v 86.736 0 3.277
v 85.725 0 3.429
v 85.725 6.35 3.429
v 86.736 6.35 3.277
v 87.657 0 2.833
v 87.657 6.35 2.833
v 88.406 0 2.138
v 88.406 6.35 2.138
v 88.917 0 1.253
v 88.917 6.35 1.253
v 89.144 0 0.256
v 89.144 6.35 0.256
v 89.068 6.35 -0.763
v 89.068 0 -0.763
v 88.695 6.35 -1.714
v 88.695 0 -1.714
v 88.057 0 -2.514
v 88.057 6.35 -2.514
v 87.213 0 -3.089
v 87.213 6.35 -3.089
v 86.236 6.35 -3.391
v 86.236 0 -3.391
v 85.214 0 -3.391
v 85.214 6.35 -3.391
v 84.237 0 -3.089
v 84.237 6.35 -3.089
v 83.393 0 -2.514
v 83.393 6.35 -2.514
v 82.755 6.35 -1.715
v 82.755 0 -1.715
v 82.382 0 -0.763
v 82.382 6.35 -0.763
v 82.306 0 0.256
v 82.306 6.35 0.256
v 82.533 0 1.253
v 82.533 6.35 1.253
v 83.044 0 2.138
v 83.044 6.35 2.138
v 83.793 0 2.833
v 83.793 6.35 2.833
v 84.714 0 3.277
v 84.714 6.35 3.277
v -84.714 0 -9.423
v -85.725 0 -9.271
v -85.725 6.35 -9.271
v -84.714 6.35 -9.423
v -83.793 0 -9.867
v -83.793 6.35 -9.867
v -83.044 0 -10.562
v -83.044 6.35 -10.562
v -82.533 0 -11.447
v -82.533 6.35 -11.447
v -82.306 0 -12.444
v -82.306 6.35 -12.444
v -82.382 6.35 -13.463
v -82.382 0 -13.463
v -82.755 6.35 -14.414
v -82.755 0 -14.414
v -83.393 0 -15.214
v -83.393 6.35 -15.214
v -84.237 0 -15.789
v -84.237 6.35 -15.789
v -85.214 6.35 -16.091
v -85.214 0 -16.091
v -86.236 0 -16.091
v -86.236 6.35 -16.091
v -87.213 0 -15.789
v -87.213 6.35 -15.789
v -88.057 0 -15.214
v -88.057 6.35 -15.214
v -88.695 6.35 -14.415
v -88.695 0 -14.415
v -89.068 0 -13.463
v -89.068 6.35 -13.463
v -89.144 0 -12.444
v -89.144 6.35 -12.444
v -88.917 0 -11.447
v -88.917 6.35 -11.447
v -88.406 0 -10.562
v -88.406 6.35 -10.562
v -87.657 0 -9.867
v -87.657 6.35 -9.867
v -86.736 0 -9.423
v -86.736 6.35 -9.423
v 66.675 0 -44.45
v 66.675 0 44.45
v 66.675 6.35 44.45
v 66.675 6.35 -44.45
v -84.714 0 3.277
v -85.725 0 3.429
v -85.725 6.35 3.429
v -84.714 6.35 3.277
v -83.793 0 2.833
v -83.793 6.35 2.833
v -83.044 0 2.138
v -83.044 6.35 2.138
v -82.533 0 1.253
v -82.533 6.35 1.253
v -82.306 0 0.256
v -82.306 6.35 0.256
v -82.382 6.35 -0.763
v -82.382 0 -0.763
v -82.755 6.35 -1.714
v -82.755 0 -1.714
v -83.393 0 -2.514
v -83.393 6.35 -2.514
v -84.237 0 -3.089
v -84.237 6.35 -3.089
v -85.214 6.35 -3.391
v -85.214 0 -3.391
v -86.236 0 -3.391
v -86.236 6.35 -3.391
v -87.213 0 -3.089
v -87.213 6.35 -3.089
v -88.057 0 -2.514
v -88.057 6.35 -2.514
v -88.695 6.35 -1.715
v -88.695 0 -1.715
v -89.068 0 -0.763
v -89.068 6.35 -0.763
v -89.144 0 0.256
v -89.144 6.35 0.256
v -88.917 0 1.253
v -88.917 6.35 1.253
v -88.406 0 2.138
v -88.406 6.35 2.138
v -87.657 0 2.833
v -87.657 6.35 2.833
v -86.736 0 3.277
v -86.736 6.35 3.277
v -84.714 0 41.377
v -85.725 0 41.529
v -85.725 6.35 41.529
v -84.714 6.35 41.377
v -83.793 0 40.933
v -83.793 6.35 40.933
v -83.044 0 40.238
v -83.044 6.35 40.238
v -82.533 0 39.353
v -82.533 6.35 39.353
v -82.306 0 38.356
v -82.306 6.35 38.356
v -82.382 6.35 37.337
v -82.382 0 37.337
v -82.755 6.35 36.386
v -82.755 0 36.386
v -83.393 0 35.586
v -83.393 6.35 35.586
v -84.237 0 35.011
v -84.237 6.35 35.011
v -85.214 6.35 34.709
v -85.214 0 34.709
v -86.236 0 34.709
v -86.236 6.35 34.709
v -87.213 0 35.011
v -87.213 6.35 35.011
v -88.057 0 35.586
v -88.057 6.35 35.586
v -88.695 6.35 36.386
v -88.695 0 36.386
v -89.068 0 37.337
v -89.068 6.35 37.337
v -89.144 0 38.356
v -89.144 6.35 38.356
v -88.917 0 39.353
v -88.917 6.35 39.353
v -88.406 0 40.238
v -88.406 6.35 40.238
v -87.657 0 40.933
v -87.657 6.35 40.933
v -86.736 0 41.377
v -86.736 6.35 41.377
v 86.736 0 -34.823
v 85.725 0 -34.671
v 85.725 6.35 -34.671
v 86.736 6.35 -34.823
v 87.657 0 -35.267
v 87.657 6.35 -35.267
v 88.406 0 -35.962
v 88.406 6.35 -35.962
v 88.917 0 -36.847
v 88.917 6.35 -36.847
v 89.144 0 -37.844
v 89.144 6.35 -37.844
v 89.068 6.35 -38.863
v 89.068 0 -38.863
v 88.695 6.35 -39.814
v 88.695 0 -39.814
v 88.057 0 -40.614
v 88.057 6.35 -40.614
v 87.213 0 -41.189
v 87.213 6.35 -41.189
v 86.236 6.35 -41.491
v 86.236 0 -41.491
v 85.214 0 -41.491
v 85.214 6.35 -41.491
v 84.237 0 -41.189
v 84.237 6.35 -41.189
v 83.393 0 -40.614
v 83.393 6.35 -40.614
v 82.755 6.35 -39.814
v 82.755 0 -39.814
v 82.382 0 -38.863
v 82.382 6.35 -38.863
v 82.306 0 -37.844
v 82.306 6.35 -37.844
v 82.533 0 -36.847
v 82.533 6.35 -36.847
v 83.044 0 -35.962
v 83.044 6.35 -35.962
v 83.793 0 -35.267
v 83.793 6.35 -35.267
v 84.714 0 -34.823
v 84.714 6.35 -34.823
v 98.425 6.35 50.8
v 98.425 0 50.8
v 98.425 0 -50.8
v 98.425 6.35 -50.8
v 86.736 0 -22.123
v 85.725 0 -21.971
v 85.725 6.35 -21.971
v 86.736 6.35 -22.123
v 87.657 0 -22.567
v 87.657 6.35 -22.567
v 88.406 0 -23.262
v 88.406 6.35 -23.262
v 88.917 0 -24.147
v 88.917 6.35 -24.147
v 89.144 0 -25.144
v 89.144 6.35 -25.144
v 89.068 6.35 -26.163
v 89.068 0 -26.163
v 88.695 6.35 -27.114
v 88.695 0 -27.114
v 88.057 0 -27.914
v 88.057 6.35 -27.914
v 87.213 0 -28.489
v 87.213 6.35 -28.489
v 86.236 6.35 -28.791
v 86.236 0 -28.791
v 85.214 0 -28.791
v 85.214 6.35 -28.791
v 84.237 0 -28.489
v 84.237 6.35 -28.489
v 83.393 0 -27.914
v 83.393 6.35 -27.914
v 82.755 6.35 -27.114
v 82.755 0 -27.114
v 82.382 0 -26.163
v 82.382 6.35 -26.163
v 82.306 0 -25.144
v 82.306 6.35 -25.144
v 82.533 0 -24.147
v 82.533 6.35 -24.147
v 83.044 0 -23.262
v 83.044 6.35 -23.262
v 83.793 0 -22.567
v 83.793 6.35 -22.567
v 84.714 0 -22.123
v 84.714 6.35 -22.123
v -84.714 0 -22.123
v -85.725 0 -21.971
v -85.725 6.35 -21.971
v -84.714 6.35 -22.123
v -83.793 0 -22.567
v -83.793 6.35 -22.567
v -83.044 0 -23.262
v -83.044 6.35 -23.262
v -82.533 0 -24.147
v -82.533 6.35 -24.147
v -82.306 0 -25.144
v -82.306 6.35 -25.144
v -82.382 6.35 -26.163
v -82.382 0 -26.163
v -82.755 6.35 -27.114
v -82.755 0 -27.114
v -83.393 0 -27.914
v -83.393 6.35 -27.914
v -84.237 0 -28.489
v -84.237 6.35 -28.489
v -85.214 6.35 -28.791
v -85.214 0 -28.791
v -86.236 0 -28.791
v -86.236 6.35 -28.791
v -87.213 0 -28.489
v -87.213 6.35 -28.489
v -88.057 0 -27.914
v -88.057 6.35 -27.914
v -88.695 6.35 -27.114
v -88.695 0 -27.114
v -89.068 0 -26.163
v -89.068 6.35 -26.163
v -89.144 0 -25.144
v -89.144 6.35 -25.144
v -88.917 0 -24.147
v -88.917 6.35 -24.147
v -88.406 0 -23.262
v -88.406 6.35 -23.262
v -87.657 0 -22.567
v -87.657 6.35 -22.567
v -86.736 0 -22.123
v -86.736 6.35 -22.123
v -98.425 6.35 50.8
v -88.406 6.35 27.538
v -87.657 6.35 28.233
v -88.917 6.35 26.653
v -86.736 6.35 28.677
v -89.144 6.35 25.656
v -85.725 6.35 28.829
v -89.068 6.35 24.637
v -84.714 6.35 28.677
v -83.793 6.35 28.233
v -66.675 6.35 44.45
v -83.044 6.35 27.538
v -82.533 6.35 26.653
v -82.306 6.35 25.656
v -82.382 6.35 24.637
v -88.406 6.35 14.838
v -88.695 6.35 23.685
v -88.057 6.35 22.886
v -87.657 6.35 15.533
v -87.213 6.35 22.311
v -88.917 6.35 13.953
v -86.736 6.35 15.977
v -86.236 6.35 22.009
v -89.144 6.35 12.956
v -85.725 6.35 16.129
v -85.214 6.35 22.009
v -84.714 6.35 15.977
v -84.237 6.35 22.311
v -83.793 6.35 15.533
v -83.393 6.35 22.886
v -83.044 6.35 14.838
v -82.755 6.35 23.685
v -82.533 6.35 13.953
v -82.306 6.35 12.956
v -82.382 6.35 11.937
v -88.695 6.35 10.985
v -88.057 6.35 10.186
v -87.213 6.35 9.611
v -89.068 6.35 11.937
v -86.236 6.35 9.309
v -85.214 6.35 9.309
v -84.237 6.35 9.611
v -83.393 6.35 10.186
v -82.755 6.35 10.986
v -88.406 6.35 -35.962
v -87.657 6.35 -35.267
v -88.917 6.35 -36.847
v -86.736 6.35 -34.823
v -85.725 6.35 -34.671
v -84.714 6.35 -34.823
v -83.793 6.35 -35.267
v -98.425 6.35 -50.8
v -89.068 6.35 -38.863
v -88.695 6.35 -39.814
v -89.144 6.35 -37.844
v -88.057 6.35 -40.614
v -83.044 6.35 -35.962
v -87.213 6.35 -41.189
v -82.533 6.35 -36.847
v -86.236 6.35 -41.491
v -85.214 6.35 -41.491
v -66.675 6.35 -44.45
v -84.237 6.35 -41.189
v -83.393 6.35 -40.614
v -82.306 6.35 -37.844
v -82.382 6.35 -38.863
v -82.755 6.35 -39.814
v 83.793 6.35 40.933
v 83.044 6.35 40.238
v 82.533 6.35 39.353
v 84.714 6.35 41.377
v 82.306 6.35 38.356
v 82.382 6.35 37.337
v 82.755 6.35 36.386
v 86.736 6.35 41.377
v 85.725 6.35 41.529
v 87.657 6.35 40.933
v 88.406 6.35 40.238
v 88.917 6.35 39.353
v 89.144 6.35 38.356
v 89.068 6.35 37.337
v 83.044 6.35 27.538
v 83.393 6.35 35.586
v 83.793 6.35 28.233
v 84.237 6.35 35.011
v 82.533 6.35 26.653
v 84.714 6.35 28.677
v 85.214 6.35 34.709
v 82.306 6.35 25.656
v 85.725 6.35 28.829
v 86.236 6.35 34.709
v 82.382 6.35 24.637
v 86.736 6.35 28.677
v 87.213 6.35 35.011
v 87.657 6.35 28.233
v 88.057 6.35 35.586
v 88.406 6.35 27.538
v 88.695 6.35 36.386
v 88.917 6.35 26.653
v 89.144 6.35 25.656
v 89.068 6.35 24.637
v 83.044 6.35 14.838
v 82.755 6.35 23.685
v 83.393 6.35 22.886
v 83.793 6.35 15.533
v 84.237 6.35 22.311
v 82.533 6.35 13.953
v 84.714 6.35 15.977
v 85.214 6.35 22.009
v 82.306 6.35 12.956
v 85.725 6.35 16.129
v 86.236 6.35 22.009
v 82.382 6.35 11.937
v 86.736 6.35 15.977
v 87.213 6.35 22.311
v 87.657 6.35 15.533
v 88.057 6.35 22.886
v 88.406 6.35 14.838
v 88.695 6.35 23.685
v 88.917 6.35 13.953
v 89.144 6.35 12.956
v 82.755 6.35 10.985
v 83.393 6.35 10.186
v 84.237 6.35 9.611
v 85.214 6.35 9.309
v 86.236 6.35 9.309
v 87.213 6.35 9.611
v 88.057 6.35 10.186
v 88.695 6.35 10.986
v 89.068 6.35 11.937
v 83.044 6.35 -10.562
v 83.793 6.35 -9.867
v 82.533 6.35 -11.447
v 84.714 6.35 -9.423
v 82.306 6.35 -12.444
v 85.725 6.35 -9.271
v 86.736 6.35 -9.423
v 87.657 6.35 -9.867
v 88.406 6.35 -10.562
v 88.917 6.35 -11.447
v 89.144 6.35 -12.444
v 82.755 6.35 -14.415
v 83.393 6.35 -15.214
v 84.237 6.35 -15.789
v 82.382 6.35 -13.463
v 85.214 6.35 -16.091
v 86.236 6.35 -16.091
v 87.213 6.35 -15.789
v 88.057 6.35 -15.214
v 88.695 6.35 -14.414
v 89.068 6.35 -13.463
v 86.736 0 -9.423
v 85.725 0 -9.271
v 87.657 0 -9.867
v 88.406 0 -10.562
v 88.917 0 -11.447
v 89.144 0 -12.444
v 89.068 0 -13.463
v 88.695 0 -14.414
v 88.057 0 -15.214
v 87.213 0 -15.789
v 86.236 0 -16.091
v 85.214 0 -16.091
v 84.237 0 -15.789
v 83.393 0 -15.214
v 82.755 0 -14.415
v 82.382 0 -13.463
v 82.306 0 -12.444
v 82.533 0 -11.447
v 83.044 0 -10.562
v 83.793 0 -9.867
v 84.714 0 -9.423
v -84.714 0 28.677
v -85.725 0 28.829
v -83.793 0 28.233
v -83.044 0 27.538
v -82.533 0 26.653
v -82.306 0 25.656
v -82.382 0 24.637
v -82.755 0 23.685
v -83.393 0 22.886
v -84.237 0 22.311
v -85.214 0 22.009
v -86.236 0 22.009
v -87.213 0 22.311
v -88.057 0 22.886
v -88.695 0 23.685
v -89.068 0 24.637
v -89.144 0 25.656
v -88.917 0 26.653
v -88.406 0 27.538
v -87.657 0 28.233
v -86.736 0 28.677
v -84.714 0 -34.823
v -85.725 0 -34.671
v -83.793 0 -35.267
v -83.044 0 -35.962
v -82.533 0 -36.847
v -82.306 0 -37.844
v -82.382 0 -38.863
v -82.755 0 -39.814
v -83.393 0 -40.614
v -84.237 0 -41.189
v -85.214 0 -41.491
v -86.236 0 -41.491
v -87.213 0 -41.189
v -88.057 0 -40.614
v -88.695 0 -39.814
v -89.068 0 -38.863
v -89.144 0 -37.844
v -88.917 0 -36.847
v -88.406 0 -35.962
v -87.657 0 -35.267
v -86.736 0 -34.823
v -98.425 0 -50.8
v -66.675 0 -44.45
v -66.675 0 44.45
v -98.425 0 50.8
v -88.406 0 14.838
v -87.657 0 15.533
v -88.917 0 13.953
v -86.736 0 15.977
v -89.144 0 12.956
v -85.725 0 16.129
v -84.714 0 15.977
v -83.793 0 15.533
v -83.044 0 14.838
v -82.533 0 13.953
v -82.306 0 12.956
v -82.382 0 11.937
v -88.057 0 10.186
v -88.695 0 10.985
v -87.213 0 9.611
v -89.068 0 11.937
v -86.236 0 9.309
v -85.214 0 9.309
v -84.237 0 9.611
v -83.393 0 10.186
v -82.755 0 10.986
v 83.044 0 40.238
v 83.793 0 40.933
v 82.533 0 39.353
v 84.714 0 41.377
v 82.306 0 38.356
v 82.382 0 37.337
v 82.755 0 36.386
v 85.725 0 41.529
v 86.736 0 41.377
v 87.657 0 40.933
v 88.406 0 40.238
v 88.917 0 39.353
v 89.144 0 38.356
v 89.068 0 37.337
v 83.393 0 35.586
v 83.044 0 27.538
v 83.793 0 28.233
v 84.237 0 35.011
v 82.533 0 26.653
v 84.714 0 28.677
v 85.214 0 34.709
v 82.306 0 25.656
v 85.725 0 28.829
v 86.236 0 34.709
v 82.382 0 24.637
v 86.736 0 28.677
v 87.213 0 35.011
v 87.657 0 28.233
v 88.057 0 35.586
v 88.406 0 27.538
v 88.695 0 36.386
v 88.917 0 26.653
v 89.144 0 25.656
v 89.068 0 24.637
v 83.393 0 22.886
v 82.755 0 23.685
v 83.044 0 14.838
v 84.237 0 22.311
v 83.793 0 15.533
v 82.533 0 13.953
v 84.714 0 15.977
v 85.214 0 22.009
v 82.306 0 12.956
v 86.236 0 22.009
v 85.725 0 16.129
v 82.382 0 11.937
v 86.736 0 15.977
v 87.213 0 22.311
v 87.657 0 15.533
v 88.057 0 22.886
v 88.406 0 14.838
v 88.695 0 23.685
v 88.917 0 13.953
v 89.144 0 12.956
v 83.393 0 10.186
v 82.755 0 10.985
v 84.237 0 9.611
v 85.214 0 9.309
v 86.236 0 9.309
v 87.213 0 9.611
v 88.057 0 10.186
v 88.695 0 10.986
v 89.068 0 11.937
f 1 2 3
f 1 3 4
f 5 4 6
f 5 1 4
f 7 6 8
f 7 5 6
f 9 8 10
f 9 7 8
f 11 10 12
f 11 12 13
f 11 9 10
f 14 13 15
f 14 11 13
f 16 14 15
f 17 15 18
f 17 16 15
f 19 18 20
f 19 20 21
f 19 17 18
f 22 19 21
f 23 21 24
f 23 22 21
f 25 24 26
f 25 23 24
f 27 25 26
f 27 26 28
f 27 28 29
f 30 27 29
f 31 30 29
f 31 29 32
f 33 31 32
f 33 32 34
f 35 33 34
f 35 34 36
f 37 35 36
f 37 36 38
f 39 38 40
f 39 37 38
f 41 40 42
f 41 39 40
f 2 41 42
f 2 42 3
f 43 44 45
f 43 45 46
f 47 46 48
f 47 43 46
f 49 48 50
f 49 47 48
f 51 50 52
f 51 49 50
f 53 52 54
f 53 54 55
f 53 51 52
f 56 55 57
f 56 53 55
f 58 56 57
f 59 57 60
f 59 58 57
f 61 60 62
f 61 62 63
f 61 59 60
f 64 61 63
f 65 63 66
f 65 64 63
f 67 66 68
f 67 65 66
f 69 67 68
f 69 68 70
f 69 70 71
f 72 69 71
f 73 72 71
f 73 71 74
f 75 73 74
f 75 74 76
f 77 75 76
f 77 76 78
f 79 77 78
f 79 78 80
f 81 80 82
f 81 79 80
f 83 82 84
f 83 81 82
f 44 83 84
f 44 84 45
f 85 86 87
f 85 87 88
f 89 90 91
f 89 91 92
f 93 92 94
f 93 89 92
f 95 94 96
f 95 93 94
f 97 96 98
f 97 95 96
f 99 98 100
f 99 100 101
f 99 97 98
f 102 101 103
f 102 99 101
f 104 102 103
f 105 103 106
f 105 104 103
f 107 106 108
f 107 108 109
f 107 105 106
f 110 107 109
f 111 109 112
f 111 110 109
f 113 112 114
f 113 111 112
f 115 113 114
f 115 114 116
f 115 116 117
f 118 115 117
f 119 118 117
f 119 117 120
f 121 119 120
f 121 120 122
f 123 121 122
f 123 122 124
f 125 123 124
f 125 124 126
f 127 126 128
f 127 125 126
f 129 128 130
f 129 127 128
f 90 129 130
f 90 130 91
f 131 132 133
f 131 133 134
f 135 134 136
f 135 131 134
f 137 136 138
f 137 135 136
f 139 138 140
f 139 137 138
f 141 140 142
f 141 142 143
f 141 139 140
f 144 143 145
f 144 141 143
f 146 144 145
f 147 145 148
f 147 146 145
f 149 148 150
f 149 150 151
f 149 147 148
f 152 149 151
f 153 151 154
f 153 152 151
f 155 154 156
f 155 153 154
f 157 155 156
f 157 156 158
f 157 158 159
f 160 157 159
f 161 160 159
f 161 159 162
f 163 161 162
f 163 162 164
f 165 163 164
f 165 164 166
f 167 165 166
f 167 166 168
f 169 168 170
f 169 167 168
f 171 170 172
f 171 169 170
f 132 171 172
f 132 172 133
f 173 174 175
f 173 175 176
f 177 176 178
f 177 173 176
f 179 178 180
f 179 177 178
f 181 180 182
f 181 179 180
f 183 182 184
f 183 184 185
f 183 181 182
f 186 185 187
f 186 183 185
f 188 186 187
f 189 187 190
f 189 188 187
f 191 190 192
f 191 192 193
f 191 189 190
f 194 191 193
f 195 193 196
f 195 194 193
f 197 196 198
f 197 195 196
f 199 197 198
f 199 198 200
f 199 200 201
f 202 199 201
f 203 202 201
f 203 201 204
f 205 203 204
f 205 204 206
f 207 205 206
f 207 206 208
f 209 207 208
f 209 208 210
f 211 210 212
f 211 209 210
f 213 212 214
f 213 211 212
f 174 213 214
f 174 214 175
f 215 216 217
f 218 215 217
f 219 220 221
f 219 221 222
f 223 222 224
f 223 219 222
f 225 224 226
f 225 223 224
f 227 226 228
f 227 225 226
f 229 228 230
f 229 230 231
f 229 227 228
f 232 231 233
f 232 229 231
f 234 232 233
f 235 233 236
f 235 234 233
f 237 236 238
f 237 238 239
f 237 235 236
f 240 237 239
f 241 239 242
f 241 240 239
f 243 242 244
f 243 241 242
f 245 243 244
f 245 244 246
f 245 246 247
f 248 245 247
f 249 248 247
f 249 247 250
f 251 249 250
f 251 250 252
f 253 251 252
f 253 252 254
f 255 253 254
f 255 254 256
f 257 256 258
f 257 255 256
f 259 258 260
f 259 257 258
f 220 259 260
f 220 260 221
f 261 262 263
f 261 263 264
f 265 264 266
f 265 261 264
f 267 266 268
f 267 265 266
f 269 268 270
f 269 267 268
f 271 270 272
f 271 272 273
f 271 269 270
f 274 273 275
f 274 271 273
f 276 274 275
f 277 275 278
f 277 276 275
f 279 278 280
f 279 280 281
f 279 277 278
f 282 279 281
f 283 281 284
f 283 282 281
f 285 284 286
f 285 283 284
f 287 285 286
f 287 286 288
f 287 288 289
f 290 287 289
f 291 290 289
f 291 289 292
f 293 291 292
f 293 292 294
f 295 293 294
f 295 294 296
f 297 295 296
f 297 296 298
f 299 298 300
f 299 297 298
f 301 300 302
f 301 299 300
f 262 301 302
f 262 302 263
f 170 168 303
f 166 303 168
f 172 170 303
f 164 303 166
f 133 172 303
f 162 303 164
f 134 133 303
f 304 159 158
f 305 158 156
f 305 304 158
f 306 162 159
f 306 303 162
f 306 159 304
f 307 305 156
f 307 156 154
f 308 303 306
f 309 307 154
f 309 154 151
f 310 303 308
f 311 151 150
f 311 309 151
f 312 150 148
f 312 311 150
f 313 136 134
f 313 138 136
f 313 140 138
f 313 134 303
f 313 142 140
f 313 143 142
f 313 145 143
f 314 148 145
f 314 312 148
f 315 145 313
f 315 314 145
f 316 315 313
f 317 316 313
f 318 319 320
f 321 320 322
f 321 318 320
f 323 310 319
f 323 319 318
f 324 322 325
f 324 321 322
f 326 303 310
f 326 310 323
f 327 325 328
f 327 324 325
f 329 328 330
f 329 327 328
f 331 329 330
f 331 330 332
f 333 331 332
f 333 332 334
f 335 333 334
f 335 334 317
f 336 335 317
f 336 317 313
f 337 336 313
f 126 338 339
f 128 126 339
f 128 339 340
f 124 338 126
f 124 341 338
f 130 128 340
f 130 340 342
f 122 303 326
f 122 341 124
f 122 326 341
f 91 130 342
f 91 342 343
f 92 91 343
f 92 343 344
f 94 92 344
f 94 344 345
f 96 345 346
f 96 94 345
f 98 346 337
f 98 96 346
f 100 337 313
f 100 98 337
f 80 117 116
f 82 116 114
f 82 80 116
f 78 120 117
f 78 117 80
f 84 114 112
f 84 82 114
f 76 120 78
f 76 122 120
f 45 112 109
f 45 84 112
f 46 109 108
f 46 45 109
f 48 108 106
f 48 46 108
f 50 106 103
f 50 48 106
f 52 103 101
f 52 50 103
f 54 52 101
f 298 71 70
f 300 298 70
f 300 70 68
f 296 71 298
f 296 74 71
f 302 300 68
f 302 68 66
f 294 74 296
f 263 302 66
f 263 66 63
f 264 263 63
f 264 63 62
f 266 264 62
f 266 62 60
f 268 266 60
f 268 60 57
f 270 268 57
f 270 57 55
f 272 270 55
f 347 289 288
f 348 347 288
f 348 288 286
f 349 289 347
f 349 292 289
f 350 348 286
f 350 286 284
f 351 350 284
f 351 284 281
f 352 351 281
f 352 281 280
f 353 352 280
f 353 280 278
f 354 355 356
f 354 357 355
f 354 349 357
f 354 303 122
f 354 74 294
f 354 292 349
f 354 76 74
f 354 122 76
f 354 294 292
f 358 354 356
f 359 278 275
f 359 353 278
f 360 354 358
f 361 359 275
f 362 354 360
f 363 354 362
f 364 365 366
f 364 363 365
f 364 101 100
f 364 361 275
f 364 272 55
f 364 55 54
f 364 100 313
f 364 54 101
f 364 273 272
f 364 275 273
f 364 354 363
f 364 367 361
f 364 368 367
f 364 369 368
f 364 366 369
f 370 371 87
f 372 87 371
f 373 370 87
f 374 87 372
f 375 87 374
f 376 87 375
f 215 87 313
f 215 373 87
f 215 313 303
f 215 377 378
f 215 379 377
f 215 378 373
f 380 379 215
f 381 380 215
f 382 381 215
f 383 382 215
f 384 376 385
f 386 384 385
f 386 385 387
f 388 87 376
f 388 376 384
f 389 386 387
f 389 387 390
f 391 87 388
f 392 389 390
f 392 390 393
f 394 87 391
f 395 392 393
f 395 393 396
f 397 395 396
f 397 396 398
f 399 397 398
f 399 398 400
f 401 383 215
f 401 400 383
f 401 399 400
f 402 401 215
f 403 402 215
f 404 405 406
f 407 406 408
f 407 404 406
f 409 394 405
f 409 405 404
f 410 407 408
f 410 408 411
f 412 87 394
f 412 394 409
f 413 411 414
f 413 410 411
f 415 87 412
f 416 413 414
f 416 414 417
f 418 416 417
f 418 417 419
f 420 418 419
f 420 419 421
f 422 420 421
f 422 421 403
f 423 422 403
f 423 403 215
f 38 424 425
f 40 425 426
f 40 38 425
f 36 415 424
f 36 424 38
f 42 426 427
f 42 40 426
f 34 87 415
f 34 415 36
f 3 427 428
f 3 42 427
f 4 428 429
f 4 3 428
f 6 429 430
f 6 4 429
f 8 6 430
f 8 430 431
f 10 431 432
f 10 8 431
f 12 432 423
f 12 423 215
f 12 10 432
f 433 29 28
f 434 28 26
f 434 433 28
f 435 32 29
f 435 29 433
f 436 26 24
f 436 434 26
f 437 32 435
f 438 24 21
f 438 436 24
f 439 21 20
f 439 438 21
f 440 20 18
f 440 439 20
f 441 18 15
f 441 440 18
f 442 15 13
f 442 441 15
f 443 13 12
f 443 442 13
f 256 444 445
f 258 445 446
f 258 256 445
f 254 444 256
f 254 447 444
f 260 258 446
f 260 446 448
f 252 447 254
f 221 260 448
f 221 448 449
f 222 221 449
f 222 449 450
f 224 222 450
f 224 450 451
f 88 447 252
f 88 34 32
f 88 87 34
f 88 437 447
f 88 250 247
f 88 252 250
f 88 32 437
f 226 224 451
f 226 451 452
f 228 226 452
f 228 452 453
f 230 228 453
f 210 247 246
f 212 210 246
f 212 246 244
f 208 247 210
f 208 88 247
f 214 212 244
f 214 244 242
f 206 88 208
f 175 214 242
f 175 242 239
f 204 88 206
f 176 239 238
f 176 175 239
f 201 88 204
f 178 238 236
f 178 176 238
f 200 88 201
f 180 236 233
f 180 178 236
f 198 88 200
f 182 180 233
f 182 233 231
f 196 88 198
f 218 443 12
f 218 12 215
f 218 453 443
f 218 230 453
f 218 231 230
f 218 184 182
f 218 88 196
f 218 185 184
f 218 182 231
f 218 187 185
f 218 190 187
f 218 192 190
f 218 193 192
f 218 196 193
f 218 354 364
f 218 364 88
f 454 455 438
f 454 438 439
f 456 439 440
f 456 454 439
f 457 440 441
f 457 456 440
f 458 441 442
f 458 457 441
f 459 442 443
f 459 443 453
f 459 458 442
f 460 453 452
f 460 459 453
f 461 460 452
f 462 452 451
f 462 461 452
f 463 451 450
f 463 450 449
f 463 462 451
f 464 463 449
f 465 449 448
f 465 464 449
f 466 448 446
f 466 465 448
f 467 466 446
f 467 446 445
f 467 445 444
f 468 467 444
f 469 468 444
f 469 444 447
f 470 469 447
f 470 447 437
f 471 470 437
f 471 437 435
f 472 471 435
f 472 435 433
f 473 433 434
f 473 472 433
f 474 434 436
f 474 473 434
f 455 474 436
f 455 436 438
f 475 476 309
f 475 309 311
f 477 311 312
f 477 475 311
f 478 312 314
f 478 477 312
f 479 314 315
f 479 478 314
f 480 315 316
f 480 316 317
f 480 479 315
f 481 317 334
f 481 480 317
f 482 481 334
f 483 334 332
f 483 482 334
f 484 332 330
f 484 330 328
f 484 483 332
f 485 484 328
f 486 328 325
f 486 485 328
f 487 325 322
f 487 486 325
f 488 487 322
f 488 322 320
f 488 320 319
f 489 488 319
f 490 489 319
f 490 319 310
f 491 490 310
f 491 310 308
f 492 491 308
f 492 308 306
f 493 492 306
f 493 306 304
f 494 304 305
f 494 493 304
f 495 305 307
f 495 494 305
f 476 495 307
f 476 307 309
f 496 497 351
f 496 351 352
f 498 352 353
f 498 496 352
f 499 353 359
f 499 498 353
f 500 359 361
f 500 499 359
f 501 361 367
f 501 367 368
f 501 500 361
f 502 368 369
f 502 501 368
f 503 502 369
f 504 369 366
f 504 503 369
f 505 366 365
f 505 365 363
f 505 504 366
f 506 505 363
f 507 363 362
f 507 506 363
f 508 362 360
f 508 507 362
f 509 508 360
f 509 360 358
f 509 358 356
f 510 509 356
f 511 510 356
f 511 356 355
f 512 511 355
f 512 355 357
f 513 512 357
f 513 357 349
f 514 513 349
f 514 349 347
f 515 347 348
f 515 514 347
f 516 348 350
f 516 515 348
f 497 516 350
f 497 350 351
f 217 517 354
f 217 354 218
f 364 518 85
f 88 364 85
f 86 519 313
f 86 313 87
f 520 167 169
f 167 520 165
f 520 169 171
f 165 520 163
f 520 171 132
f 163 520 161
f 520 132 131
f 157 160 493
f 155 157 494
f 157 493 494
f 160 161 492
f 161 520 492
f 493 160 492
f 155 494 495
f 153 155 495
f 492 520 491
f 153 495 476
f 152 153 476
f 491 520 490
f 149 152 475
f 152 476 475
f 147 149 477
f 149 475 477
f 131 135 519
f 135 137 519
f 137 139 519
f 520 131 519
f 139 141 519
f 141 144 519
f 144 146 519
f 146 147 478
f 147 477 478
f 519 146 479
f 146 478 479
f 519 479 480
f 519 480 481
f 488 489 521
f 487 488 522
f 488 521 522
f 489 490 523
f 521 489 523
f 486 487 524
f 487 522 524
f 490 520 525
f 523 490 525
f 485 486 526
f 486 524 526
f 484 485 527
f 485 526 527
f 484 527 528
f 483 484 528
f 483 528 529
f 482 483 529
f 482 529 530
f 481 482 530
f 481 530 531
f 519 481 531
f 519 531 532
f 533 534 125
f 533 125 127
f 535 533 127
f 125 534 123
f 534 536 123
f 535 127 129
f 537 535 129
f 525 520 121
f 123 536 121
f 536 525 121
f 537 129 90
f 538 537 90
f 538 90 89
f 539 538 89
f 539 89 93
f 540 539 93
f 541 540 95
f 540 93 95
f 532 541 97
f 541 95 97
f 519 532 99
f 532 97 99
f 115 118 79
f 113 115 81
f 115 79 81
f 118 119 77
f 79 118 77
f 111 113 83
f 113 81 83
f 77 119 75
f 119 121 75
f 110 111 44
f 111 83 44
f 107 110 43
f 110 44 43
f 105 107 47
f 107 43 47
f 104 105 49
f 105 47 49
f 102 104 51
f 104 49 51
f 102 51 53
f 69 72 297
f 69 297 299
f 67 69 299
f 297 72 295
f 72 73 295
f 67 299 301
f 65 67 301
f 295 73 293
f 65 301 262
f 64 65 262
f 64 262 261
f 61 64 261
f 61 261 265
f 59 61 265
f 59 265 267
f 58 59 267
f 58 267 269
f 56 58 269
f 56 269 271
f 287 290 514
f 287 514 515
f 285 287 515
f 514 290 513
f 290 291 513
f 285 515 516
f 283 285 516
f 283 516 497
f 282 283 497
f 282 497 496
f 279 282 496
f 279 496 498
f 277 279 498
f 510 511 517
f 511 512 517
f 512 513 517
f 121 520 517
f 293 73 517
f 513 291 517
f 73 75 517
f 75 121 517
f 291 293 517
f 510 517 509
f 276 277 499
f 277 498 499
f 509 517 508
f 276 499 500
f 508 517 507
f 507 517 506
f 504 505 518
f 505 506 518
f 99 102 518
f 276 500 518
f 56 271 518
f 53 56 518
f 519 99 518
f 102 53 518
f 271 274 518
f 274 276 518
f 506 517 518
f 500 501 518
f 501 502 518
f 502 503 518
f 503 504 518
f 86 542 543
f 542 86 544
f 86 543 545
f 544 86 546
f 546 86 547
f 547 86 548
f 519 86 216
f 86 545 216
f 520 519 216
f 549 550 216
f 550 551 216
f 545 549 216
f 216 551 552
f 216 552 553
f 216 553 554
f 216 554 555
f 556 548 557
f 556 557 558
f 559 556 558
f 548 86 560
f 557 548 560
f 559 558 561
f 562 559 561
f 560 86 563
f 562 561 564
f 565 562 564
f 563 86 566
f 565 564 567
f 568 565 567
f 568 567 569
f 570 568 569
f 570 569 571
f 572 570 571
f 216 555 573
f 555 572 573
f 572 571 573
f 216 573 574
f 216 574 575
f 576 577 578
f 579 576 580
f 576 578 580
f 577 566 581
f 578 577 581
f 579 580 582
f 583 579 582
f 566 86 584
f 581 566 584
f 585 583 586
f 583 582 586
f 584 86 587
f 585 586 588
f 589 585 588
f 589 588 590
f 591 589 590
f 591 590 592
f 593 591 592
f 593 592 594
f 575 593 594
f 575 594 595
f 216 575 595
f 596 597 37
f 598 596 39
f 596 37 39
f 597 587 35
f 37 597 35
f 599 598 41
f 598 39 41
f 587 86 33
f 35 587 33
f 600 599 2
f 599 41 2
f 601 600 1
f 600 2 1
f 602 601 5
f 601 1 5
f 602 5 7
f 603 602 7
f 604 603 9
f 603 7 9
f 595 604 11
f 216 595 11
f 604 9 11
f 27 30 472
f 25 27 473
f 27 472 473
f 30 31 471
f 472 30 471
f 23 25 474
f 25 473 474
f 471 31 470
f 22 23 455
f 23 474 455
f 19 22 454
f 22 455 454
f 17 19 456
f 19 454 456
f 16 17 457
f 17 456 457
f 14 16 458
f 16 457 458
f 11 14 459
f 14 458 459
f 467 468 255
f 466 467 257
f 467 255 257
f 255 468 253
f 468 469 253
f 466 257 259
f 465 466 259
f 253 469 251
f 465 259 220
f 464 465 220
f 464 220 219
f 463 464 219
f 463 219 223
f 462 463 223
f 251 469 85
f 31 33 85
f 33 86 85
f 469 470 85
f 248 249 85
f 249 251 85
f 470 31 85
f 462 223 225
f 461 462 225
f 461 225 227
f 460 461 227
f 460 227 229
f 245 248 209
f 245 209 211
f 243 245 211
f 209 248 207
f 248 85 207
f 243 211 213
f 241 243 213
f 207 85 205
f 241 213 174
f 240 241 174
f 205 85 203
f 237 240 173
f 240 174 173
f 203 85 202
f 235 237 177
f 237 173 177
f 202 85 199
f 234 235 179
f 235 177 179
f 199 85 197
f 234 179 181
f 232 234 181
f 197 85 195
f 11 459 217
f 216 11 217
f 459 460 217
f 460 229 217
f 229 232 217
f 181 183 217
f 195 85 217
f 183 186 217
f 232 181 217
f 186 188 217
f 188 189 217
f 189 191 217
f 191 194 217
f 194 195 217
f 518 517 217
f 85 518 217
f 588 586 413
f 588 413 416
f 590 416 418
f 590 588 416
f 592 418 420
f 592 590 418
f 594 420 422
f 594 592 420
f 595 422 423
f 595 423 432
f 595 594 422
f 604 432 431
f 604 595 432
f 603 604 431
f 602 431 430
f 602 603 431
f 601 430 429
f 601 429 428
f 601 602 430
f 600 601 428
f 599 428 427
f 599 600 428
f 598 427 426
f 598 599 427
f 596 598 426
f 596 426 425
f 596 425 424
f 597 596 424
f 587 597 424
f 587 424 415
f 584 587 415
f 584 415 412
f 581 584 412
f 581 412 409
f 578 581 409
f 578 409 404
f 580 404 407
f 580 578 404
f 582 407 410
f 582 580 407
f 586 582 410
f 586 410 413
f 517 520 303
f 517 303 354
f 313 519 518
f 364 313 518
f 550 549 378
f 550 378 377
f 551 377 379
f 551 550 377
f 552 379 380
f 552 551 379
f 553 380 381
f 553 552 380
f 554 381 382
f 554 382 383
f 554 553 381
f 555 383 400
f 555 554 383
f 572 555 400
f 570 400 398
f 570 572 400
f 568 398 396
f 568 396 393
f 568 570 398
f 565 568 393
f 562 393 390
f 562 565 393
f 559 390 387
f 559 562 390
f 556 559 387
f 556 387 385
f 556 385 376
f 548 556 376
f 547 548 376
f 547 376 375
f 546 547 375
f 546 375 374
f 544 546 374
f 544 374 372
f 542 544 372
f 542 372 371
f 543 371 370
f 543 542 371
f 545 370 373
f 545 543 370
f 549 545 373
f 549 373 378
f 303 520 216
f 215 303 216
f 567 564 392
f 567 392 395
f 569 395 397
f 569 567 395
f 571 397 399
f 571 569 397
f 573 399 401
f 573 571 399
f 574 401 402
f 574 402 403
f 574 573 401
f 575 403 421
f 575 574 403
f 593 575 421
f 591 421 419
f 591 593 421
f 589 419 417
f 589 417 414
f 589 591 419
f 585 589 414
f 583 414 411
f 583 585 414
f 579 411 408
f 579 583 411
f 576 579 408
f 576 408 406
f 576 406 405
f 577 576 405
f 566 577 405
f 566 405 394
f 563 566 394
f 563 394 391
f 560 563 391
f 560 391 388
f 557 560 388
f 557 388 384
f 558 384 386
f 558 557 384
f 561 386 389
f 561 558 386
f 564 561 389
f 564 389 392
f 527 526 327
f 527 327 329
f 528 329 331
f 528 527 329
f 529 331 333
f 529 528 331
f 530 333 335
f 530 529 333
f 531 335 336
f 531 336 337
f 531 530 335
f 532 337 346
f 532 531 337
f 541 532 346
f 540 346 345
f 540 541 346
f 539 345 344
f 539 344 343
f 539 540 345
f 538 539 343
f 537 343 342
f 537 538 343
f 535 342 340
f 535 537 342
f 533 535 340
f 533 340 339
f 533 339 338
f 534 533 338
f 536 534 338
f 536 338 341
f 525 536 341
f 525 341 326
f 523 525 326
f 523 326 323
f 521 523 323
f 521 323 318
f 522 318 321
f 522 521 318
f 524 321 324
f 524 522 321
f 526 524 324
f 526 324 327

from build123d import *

# Parameters (mm, degrees)
SKETCH1_W           = 196.85
SKETCH1_H           = 101.6
SKETCH1_R           = 3.429
SKETCH1_W_2         = 133.35
SKETCH1_H_2         = 88.9
BOSS_EXTRUDE1_DEPTH = 6.35


with BuildPart() as part:
    # Sketch1 → Boss-Extrude1 (new body)
    with BuildSketch(Plane(origin=(0, 0, 0), x_dir=(1, 0, 0), z_dir=(0, 1, 0))):
        Rectangle(SKETCH1_W, SKETCH1_H)
        with Locations(Location((-85.725, 38.1, 0), (0, 0, 270))):
            Circle(SKETCH1_R, mode=Mode.SUBTRACT)
        with Locations(Location((85.725, 38.1, 0), (0, 0, 270))):
            Circle(SKETCH1_R, mode=Mode.SUBTRACT)
        with Locations(Location((85.725, 25.4, 0), (0, 0, 270))):
            Circle(SKETCH1_R, mode=Mode.SUBTRACT)
        with Locations(Location((85.725, 12.7, 0), (0, 0, 270))):
            Circle(SKETCH1_R, mode=Mode.SUBTRACT)
        with Locations(Location((85.725, 0, 0), (0, 0, 270))):
            Circle(SKETCH1_R, mode=Mode.SUBTRACT)
        with Locations(Location((85.725, -12.7, 0), (0, 0, 270))):
            Circle(SKETCH1_R, mode=Mode.SUBTRACT)
        with Locations(Location((85.725, -25.4, 0), (0, 0, 270))):
            Circle(SKETCH1_R, mode=Mode.SUBTRACT)
        with Locations(Location((85.725, -38.1, 0), (0, 0, 270))):
            Circle(SKETCH1_R, mode=Mode.SUBTRACT)
        with Locations(Location((-85.725, 25.4, 0), (0, 0, 270))):
            Circle(SKETCH1_R, mode=Mode.SUBTRACT)
        with Locations(Location((-85.725, 12.7, 0), (0, 0, 270))):
            Circle(SKETCH1_R, mode=Mode.SUBTRACT)
        with Locations(Location((-85.725, 0, 0), (0, 0, 270))):
            Circle(SKETCH1_R, mode=Mode.SUBTRACT)
        with Locations(Location((-85.725, -12.7, 0), (0, 0, 270))):
            Circle(SKETCH1_R, mode=Mode.SUBTRACT)
        with Locations(Location((-85.725, -25.4, 0), (0, 0, 270))):
            Circle(SKETCH1_R, mode=Mode.SUBTRACT)
        with Locations(Location((-85.725, -38.1, 0), (0, 0, 270))):
            Circle(SKETCH1_R, mode=Mode.SUBTRACT)
        Rectangle(SKETCH1_W_2, SKETCH1_H_2, mode=Mode.SUBTRACT)
    extrude(amount=BOSS_EXTRUDE1_DEPTH)


solid = part.part
